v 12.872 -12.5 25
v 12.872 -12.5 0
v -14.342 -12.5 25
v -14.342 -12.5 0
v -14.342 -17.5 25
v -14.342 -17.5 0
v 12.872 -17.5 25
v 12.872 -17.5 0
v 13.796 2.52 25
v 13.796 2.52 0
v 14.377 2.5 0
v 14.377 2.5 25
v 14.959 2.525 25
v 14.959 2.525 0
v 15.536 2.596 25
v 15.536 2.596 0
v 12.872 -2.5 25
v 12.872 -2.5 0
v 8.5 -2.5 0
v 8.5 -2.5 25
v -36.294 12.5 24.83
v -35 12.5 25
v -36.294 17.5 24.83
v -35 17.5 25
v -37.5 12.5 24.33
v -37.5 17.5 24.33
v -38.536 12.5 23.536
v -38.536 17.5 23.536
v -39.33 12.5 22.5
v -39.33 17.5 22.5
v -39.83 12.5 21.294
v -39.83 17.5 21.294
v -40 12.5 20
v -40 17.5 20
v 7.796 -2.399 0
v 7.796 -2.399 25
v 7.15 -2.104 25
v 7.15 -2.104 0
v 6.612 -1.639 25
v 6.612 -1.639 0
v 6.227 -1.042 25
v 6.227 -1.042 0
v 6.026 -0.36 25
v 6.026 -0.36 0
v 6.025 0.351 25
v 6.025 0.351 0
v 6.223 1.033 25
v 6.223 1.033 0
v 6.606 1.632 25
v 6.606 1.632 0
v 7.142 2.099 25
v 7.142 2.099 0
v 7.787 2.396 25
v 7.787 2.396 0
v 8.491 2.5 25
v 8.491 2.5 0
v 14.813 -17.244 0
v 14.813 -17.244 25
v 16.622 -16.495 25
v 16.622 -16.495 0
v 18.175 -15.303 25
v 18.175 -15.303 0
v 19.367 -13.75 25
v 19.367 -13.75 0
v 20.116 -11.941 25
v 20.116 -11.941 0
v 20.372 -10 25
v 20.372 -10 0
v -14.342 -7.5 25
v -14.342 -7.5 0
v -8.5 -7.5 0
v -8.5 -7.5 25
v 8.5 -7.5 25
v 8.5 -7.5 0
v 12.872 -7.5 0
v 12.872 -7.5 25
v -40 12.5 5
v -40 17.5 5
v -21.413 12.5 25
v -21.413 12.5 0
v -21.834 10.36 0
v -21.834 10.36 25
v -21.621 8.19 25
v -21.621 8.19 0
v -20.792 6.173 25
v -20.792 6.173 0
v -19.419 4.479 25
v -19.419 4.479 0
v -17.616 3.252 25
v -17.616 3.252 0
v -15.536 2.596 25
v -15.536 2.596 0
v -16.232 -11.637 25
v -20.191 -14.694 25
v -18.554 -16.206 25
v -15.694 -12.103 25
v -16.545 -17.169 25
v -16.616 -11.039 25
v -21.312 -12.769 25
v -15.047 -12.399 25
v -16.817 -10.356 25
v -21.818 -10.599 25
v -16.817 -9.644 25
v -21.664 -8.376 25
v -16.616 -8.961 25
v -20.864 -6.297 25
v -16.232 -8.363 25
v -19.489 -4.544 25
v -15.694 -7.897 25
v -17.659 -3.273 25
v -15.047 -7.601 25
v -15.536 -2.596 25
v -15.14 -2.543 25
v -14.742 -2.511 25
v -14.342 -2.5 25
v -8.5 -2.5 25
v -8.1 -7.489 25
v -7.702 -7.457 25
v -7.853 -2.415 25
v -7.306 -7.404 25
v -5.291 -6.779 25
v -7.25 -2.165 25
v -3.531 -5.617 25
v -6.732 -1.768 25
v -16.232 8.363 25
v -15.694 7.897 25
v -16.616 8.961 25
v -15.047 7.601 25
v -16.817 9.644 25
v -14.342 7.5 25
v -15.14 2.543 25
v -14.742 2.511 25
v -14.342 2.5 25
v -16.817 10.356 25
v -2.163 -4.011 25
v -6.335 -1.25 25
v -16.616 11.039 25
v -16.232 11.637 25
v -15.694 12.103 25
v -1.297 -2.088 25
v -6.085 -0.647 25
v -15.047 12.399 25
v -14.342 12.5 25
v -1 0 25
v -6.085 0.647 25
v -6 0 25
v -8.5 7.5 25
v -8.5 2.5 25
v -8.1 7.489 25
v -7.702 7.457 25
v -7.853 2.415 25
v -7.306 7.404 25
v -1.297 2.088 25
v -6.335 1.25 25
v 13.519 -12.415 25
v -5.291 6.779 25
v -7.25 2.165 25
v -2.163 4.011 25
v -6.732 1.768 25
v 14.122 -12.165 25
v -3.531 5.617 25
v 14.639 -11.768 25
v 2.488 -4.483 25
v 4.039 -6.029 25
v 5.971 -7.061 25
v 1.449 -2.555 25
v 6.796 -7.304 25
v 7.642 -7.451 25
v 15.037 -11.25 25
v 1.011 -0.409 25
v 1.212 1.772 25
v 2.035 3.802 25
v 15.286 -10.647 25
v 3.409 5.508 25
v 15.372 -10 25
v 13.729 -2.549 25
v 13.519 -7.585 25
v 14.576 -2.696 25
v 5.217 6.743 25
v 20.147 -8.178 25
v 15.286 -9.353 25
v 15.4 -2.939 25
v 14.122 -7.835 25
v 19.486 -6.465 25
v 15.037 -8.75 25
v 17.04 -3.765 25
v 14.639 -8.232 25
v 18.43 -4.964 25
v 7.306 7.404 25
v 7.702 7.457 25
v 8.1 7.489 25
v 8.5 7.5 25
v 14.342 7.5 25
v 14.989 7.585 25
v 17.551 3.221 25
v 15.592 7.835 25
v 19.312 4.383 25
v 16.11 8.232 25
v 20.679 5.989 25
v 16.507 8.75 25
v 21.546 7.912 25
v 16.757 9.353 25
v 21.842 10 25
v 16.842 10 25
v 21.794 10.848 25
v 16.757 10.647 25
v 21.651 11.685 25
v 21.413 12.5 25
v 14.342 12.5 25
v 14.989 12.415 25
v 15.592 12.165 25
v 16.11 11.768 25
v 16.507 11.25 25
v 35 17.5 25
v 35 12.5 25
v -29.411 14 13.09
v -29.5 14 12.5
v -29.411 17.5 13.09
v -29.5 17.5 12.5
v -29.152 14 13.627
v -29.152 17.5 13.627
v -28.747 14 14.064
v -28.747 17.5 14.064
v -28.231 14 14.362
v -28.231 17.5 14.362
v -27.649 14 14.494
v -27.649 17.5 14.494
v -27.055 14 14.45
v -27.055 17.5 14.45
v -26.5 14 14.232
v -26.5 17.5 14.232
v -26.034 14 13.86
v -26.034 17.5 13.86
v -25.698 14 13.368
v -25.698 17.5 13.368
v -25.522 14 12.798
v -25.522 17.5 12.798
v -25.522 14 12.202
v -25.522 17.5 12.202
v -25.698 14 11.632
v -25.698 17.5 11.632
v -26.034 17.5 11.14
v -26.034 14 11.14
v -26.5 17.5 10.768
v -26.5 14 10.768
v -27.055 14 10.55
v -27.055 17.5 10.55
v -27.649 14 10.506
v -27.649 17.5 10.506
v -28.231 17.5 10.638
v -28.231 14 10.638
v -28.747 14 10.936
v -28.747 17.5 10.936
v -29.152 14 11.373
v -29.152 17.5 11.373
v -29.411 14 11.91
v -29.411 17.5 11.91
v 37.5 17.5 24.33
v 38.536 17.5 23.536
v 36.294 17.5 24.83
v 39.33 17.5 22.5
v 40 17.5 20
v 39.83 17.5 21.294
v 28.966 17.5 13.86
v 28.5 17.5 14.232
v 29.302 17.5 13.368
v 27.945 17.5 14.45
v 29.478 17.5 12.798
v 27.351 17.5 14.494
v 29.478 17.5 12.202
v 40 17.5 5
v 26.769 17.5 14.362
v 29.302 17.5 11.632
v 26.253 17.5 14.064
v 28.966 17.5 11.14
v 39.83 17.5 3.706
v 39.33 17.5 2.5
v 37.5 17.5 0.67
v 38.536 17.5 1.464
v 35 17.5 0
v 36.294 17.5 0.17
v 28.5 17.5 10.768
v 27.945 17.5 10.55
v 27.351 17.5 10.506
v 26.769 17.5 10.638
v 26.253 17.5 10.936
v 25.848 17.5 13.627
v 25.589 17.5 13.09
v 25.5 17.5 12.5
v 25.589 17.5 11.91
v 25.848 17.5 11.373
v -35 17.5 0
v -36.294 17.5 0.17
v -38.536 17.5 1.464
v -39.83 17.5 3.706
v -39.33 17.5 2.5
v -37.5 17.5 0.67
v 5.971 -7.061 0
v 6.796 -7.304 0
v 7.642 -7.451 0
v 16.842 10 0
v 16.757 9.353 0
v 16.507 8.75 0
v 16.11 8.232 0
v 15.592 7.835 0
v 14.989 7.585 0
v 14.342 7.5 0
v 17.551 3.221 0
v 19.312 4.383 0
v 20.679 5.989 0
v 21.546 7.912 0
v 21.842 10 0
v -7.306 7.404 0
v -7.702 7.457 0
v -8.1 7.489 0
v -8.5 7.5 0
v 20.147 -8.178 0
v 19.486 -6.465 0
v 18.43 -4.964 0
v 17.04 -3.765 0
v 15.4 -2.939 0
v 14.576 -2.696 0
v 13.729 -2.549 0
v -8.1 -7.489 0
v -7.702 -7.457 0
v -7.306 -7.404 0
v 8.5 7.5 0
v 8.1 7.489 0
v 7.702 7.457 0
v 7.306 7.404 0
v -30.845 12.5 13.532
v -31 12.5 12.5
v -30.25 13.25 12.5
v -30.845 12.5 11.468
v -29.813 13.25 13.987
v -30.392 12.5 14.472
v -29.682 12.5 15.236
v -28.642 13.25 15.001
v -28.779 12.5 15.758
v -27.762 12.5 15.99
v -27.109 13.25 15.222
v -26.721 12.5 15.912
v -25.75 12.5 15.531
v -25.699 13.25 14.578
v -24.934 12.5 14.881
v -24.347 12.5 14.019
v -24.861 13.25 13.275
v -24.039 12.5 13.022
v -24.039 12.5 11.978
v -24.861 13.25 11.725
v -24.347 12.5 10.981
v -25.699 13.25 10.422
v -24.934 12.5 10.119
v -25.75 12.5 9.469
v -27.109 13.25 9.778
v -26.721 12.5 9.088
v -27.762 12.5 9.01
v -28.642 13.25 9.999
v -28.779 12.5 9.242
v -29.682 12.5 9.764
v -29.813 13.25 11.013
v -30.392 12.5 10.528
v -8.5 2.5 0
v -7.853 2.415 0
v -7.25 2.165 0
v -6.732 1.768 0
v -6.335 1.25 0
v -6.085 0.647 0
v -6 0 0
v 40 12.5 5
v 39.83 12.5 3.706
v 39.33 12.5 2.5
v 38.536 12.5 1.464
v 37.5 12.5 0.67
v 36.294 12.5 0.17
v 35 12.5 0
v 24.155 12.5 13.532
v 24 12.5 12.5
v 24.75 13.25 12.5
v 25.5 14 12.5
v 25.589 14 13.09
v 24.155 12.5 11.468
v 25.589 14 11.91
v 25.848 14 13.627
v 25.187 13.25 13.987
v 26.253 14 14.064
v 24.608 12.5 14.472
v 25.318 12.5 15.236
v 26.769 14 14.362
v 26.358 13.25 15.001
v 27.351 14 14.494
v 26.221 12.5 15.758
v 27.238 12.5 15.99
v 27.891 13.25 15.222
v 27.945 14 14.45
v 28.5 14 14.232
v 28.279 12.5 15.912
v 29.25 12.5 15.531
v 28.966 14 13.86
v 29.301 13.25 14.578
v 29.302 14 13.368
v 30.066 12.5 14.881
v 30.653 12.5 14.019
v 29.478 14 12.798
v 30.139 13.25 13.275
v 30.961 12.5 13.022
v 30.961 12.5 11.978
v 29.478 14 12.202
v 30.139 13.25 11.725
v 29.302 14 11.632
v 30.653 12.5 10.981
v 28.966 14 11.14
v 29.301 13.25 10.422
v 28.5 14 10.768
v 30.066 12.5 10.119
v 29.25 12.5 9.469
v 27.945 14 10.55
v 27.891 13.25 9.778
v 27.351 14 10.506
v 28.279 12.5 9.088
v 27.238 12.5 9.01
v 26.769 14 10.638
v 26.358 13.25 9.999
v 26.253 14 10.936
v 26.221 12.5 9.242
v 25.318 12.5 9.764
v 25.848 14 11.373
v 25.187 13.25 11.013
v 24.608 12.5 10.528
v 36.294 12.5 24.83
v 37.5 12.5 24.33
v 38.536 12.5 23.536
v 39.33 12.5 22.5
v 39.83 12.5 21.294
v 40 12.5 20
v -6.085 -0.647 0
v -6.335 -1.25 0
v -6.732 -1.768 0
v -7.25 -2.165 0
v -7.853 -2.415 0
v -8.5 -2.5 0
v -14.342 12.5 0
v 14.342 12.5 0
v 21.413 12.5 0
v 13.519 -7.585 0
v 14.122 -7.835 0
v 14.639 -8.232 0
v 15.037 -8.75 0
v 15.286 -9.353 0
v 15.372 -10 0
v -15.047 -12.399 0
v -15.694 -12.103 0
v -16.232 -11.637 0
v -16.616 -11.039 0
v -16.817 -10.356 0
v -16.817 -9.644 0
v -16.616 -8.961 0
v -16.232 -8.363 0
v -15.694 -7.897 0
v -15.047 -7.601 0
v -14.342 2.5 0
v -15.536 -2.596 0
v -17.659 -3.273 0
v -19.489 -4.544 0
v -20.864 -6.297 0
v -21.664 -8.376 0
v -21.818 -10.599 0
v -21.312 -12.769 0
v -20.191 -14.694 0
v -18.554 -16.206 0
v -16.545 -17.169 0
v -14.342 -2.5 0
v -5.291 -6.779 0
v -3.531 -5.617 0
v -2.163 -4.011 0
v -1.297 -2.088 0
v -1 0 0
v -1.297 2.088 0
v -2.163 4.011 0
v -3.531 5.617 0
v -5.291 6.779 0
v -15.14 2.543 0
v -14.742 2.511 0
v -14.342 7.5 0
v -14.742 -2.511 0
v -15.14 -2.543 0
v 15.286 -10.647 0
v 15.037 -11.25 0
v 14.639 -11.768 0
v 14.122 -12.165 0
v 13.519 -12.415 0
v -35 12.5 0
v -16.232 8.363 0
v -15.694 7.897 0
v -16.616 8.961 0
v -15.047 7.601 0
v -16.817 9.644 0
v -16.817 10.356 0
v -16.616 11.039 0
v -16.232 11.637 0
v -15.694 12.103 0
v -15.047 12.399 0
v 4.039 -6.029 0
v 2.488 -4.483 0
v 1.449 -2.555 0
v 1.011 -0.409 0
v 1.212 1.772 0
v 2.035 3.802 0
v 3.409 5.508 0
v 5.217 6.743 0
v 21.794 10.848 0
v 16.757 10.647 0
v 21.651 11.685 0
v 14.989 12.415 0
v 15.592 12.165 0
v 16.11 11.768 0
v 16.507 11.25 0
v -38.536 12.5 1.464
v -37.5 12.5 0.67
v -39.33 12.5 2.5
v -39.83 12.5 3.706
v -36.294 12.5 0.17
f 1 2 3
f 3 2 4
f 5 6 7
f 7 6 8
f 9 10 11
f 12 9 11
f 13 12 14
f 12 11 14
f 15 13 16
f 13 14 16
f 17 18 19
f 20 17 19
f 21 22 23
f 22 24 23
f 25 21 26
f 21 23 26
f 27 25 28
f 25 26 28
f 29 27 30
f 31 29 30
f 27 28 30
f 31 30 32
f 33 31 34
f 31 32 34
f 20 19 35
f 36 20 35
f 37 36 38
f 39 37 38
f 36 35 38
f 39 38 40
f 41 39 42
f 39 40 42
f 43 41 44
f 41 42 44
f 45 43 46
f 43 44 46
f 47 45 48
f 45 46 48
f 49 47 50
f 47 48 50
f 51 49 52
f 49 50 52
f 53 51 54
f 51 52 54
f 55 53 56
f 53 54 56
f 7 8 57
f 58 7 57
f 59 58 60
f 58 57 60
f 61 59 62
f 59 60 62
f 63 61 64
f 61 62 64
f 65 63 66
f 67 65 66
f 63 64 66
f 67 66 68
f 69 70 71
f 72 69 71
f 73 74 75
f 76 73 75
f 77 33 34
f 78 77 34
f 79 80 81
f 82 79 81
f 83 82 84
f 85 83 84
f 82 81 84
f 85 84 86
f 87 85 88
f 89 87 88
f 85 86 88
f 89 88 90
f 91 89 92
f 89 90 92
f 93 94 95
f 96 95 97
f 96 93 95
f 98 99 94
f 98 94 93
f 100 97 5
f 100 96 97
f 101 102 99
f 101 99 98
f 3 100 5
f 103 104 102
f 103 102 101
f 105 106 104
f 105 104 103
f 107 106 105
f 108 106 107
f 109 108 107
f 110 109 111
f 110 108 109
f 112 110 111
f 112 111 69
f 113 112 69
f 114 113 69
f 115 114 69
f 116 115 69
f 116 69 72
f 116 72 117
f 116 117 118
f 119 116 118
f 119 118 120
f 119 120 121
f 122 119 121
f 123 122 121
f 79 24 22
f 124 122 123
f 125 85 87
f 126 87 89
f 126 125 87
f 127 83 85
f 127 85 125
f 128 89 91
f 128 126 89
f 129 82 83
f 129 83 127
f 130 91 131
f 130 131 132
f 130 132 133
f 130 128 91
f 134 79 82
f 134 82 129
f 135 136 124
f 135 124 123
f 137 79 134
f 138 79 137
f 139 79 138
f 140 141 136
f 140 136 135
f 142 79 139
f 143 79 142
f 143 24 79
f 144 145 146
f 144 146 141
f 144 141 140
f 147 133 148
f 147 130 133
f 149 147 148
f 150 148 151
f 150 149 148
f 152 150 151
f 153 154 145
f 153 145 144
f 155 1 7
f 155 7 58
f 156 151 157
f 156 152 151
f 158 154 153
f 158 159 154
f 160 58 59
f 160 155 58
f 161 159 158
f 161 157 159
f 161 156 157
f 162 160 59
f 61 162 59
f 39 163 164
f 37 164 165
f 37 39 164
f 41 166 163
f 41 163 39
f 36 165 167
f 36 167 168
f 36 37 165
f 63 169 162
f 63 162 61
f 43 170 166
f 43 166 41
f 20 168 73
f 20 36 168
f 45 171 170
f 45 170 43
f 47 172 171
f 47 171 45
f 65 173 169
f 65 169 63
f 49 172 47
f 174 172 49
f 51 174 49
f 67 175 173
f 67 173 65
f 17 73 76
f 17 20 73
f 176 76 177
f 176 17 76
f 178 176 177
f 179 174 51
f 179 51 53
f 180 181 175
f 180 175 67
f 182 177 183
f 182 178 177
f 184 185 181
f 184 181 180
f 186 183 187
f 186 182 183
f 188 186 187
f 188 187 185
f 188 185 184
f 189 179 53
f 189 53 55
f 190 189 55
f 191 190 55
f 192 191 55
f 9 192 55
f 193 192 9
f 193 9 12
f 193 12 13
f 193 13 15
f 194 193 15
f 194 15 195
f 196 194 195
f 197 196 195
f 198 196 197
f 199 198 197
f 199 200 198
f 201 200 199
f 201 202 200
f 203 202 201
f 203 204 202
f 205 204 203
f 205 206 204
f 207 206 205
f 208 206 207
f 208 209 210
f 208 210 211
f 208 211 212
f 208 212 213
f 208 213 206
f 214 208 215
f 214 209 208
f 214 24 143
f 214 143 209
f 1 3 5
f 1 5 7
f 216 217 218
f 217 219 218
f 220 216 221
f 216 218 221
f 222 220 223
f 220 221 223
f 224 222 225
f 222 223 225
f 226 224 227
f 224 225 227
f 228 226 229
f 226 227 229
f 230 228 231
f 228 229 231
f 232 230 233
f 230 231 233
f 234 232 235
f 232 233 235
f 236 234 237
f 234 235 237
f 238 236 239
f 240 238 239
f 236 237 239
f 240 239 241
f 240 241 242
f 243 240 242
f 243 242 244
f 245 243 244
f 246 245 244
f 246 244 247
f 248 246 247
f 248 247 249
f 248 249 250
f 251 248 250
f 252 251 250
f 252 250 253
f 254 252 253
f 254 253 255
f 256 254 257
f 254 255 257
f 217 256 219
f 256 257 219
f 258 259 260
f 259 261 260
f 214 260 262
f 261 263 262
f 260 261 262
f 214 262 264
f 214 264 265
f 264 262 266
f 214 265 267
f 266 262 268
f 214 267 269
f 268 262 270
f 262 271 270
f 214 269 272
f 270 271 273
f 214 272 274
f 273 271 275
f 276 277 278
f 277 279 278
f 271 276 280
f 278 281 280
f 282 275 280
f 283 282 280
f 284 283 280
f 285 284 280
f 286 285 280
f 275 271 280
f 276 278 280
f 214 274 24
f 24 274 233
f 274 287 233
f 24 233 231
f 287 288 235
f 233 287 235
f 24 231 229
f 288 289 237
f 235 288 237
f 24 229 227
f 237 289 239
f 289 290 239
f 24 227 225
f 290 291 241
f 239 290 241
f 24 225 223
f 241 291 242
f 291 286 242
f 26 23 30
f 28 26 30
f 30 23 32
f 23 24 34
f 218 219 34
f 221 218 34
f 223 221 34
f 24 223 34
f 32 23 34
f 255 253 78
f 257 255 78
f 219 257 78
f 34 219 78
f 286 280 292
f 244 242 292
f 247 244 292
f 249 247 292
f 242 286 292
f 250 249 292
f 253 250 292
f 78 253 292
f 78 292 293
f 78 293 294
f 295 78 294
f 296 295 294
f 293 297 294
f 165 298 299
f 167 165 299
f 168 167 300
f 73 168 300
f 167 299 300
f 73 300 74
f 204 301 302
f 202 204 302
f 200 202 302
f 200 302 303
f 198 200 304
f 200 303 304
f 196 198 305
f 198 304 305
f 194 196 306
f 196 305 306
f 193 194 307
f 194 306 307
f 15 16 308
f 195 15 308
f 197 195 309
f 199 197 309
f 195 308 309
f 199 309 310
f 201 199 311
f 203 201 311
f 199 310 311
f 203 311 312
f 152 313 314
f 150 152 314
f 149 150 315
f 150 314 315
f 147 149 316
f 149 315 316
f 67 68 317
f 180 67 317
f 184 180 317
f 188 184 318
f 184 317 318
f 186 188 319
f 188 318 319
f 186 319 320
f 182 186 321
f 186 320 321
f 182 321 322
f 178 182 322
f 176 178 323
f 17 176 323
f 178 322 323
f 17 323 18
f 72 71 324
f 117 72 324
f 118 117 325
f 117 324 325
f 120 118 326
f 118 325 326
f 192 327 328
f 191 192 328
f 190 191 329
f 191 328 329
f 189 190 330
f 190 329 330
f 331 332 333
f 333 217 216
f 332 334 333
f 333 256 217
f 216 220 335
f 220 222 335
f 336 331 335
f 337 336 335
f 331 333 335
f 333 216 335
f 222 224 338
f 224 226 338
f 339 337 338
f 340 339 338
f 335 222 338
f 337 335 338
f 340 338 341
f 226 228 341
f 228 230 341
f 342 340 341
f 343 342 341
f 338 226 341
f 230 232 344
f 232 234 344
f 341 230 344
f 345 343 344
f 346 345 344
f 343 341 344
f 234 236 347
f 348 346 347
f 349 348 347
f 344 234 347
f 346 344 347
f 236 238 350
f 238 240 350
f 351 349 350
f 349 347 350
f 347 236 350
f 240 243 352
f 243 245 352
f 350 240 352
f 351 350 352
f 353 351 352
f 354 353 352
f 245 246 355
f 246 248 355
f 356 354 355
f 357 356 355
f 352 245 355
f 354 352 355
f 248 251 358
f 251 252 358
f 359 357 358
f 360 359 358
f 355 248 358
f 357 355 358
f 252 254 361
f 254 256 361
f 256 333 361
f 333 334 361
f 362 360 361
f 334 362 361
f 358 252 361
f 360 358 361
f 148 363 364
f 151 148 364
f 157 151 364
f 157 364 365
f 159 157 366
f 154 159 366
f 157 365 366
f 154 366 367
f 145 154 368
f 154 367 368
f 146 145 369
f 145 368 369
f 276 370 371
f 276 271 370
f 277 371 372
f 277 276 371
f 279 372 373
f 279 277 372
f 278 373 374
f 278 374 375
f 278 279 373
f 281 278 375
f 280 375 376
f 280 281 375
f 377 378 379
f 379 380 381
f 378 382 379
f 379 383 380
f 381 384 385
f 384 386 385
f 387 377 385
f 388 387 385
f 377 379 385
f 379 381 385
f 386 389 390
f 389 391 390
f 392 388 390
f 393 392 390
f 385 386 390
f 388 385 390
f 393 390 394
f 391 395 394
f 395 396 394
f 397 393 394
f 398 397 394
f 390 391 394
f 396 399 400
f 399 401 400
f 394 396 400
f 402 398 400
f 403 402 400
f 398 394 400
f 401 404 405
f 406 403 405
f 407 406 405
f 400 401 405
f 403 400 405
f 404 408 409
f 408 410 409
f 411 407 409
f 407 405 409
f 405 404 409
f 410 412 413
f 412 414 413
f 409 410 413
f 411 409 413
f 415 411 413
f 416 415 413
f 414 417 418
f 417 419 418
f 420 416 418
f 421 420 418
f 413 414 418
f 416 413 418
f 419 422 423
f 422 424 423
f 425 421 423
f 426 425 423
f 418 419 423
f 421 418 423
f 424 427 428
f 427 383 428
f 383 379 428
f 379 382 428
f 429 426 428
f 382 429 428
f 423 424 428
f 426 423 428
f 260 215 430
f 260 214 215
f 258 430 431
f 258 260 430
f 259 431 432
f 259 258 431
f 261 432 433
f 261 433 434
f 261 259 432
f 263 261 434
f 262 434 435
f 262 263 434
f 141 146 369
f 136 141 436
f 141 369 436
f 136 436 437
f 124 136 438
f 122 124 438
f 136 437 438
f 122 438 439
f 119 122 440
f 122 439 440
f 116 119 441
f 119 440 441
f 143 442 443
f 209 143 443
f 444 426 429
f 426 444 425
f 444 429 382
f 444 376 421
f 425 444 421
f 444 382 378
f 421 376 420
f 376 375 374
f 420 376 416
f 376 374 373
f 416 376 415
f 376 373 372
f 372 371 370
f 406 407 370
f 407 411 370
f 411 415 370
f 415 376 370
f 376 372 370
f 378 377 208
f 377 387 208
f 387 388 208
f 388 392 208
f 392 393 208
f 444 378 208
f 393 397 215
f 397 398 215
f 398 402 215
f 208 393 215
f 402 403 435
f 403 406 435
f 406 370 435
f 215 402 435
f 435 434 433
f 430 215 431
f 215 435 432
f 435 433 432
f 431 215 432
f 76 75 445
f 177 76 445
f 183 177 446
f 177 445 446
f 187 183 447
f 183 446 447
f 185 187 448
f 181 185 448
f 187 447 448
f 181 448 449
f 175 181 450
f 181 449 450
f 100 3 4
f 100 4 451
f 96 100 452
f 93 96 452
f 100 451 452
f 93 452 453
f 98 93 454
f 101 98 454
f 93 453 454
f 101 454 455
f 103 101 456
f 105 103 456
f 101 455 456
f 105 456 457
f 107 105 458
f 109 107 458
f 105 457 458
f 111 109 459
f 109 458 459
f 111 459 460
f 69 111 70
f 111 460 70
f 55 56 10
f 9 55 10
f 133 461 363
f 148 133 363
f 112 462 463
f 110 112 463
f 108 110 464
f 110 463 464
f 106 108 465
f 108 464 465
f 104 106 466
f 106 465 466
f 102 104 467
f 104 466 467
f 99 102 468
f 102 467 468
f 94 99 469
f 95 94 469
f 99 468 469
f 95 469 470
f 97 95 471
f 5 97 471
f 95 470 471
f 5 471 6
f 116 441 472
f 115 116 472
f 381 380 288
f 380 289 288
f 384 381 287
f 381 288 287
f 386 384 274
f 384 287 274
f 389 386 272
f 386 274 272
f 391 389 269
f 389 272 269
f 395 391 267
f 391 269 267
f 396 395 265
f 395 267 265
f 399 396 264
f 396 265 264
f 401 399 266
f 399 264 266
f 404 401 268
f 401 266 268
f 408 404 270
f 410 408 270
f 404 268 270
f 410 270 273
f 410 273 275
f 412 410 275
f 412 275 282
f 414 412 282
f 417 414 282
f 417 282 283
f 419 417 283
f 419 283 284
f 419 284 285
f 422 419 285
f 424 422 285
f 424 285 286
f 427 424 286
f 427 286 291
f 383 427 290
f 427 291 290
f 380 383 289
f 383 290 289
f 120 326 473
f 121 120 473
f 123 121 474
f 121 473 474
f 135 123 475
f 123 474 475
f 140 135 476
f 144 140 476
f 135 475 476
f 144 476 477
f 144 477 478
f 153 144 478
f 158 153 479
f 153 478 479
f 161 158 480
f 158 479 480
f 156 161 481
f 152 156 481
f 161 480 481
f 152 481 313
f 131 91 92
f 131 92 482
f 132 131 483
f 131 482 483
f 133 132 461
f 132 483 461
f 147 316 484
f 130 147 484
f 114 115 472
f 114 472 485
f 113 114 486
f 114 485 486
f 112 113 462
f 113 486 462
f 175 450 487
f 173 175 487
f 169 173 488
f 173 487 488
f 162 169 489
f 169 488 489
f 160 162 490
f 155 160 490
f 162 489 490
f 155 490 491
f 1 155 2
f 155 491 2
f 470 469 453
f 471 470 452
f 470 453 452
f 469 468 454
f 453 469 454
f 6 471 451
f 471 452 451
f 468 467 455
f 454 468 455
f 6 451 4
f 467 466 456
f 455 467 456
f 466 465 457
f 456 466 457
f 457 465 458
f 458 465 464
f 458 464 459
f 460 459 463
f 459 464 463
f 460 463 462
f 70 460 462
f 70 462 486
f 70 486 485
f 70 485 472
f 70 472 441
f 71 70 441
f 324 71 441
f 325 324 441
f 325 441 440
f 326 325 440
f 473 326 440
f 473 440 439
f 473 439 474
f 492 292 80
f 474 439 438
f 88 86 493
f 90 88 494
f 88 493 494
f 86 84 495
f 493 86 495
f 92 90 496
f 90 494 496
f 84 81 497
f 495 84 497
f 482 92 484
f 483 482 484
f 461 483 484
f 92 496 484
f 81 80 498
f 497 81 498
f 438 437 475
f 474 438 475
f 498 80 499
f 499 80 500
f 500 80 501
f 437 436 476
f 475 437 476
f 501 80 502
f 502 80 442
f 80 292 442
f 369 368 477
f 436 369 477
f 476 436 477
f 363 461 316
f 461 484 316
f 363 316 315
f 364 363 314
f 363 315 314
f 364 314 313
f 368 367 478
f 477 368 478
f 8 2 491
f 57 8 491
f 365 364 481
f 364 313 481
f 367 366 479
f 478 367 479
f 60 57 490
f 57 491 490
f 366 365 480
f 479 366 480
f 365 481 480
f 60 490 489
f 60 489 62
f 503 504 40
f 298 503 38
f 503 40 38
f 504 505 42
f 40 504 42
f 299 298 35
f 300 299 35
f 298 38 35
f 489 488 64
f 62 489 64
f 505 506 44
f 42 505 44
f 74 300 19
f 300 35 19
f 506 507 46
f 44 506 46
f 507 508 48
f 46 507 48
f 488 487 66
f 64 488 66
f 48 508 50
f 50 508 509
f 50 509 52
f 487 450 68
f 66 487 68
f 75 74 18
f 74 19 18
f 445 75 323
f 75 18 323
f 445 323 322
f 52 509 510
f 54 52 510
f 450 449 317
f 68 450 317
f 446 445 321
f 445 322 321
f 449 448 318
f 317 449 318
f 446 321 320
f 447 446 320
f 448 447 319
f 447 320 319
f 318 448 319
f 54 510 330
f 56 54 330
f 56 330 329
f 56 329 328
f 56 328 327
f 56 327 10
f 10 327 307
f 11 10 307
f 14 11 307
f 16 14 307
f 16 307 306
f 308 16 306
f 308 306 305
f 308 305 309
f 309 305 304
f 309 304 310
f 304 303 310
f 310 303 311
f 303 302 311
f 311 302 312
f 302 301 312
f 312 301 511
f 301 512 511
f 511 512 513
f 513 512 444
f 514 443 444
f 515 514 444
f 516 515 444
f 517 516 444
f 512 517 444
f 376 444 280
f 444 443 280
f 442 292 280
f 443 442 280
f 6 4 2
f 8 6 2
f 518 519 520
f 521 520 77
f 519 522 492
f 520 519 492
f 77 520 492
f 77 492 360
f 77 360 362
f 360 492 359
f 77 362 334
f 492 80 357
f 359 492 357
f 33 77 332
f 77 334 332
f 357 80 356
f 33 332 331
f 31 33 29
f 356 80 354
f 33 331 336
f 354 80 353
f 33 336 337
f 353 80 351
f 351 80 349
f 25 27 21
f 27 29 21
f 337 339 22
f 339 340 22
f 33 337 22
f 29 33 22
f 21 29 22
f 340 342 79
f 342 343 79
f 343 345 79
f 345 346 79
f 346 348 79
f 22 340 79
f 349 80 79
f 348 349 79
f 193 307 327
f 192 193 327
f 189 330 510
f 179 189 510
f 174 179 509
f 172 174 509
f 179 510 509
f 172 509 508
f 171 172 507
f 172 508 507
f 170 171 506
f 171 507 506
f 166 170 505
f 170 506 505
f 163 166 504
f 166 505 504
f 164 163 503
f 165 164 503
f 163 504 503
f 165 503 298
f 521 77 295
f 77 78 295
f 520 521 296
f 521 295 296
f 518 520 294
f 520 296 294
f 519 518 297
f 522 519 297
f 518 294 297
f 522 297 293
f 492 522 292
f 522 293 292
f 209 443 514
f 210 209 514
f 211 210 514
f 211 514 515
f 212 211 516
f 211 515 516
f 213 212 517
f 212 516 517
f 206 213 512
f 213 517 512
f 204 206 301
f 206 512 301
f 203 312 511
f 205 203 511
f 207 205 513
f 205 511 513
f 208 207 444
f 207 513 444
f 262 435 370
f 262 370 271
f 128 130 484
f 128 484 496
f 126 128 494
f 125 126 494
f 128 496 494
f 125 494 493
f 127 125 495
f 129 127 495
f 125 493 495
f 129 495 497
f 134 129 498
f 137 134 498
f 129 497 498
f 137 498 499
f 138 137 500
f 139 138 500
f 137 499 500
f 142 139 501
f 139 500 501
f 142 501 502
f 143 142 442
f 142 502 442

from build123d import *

# Parameters (mm, degrees)
F1_DEPTH       = 25
F2_W           = 5
F2_H           = 25
F3_DEPTH       = 40
F4_R           = 5
F6_D           = 4
F6_CSINK_D     = 7
F6_CSINK_ANGLE = 90


# Not quite as in the source:
# - a feature names something its author has since deleted; it is built from what else it names


with BuildPart() as f1:
    # F0 (on Top) → F1 (new body)
    with BuildSketch(Plane.XY):
        with BuildLine():
            ThreePointArc((-14.3421743065, 17.5), (-10.0120472875, 16.123724357), (-7.2711064946, 12.5))
            Line((-7.2711064946, 12.5), (7.2711064946, 12.5))
            ThreePointArc((7.2711064946, 12.5), (10.0120472875, 16.123724357), (14.3421743065, 17.5))
            Line((14.3421743065, 17.5), (-14.3421743065, 17.5))
        make_face()
        with BuildLine():
            ThreePointArc((-7.2711064946, -12.5), (-10.0120472875, -16.123724357), (-14.3421743065, -17.5))
            Line((-14.3421743065, -17.5), (12.8716113806, -17.5))
            ThreePointArc((12.8716113806, -17.5), (8.5414843617, -16.123724357), (5.8005435687, -12.5))
            Line((5.8005435687, -12.5), (-7.2711064946, -12.5))
        make_face()
        with BuildLine():
            ThreePointArc((14.3421743065, 17.5), (10.0120472875, 16.123724357), (7.2711064946, 12.5))
            Line((7.2711064946, 12.5), (14.3421743065, 12.5))
            ThreePointArc((14.3421743065, 12.5), (16.1099412594, 11.767766953), (16.8421743065, 10))
            ThreePointArc((16.8421743065, 10), (16.1099412594, 8.232233047), (14.3421743065, 7.5))
            Line((14.3421743065, 7.5), (8.5, 7.5))
            ThreePointArc((8.5, 7.5), (12.7884854356, 6.1529580422), (15.5364989199, 2.5957047116))
            ThreePointArc((15.5364989199, 2.5957047116), (20.052140795, 5.1372556412), (21.8421743065, 10))
            ThreePointArc((21.8421743065, 10), (19.6454751654, 15.3033008589), (14.3421743065, 17.5))
        make_face()
        with BuildLine():
            ThreePointArc((-14.3421743065, 7.5), (-16.8421743065, 10), (-14.3421743065, 12.5))
            Line((-14.3421743065, 12.5), (-7.2711064946, 12.5))
            ThreePointArc((-7.2711064946, 12.5), (-10.0120472875, 16.123724357), (-14.3421743065, 17.5))
            ThreePointArc((-14.3421743065, 17.5), (-21.8182098422, 10.5990765131), (-15.5364989199, 2.5957047116))
            ThreePointArc((-15.5364989199, 2.5957047116), (-12.7884854356, 6.1529580422), (-8.5, 7.5))
            Line((-8.5, 7.5), (-14.3421743065, 7.5))
        make_face()
        with BuildLine():
            ThreePointArc((-7.3056753865, 7.4042952884), (-7.9009234869, 7.4760355357), (-8.5, 7.5))
            ThreePointArc((-8.5, 7.5), (-12.7884854356, 6.1529580422), (-15.5364989199, 2.5957047116))
            ThreePointArc((-15.5364989199, 2.5957047116), (-14.9412508196, 2.5239644643), (-14.3421743065, 2.5))
            ThreePointArc((-14.3421743065, 2.5), (-10.0536888708, 3.8470419578), (-7.3056753865, 7.4042952884))
        make_face()
        with BuildLine():
            ThreePointArc((-1, 0), (-2.7900335114, 4.8627443588), (-7.3056753865, 7.4042952884))
            ThreePointArc((-7.3056753865, 7.4042952884), (-10.0536888708, 3.8470419578), (-14.3421743065, 2.5))
            Line((-14.3421743065, 2.5), (-8.5, 2.5))
            ThreePointArc((-8.5, 2.5), (-6.732233047, 1.767766953), (-6, 0))
            ThreePointArc((-6, 0), (-6.732233047, -1.767766953), (-8.5, -2.5))
            Line((-8.5, -2.5), (-14.3421743065, -2.5))
            ThreePointArc((-14.3421743065, -2.5), (-10.0536888708, -3.8470419578), (-7.3056753865, -7.4042952884))
            ThreePointArc((-7.3056753865, -7.4042952884), (-2.7900335114, -4.8627443588), (-1, 0))
        make_face()
        with BuildLine():
            ThreePointArc((-14.3421743065, -2.5), (-14.9412508196, -2.5239644643), (-15.5364989199, -2.5957047116))
            ThreePointArc((-15.5364989199, -2.5957047116), (-12.7884854356, -6.1529580422), (-8.5, -7.5))
            ThreePointArc((-8.5, -7.5), (-7.9009234869, -7.4760355357), (-7.3056753865, -7.4042952884))
            ThreePointArc((-7.3056753865, -7.4042952884), (-10.0536888708, -3.8470419578), (-14.3421743065, -2.5))
        make_face()
        with BuildLine():
            ThreePointArc((12.8716113806, -2.5), (8.7359797123, -3.7432795568), (5.9714803927, -7.0609198123))
            ThreePointArc((5.9714803927, -7.0609198123), (7.2168200812, -7.3894146789), (8.5, -7.5))
            ThreePointArc((8.5, -7.5), (12.6356316683, -6.2567204432), (15.4001309879, -2.9390801877))
            ThreePointArc((15.4001309879, -2.9390801877), (14.1547912994, -2.6105853211), (12.8716113806, -2.5))
        make_face()
        with BuildLine():
            ThreePointArc((8.5, 7.5), (7.9009234869, 7.4760355357), (7.3056753865, 7.4042952884))
            ThreePointArc((7.3056753865, 7.4042952884), (9.8321935715, 4.0074985381), (13.7956134511, 2.5199417628))
            ThreePointArc((13.7956134511, 2.5199417628), (14.6682639838, 2.5070923186), (15.5364989199, 2.5957047116))
            ThreePointArc((15.5364989199, 2.5957047116), (12.7884854356, 6.1529580422), (8.5, 7.5))
        make_face()
        with BuildLine():
            ThreePointArc((13.7956134511, 2.5199417628), (9.8321935715, 4.0074985381), (7.3056753865, 7.4042952884))
            ThreePointArc((7.3056753865, 7.4042952884), (1.0317000428, 0.6888365189), (5.9714803927, -7.0609198123))
            ThreePointArc((5.9714803927, -7.0609198123), (8.7359797123, -3.7432795568), (12.8716113806, -2.5))
            Line((12.8716113806, -2.5), (8.5, -2.5))
            ThreePointArc((8.5, -2.5), (6.0000044235, -0.0047029402), (8.4905941362, 2.4999823059))
            Line((8.4905941362, 2.4999823059), (13.7956134511, 2.5199417628))
        make_face()
        with BuildLine():
            ThreePointArc((-8.5, -7.5), (-12.7884854356, -6.1529580422), (-15.5364989199, -2.5957047116))
            ThreePointArc((-15.5364989199, -2.5957047116), (-21.8182098422, -10.5990765131), (-14.3421743065, -17.5))
            ThreePointArc((-14.3421743065, -17.5), (-10.0120472875, -16.123724357), (-7.2711064946, -12.5))
            Line((-7.2711064946, -12.5), (-14.3421743065, -12.5))
            ThreePointArc((-14.3421743065, -12.5), (-16.8421743065, -10), (-14.3421743065, -7.5))
            Line((-14.3421743065, -7.5), (-8.5, -7.5))
        make_face()
        with BuildLine():
            Line((12.8716113806, -12.5), (5.8005435687, -12.5))
            ThreePointArc((5.8005435687, -12.5), (8.5414843617, -16.123724357), (12.8716113806, -17.5))
            ThreePointArc((12.8716113806, -17.5), (18.1749122395, -15.3033008589), (20.3716113806, -10))
            ThreePointArc((20.3716113806, -10), (19.0040618311, -5.6822399936), (15.4001309879, -2.9390801877))
            ThreePointArc((15.4001309879, -2.9390801877), (12.6356316683, -6.2567204432), (8.5, -7.5))
            Line((8.5, -7.5), (12.8716113806, -7.5))
            ThreePointArc((12.8716113806, -7.5), (14.6393783336, -8.232233047), (15.3716113806, -10))
            ThreePointArc((15.3716113806, -10), (14.6393783336, -11.767766953), (12.8716113806, -12.5))
        make_face()
    extrude(amount=F1_DEPTH)

    # F2 (on Right) → F3 (join, symmetric)
    with BuildSketch(Plane.YZ):
        with Locations((15, 12.5)):
            Rectangle(F2_W, F2_H)
    extrude(amount=F3_DEPTH, both=True)

    # F4
    f4_edges = [f1.edges().sort_by_distance(p)[0] for p in [
        (40, 15, 0),
        (40, 15, 25),
        (-40, 15, 25),
        (-40, 15, 0),
    ]]
    fillet(f4_edges, radius=F4_R)

    # F6 (through all)
    with Locations(Plane.XZ.offset(-12.5)):
        with Locations((27.5, 12.5), (-27.5, 12.5)):
            CounterSinkHole(F6_D / 2, F6_CSINK_D / 2, counter_sink_angle=F6_CSINK_ANGLE)


solid = f1.part
